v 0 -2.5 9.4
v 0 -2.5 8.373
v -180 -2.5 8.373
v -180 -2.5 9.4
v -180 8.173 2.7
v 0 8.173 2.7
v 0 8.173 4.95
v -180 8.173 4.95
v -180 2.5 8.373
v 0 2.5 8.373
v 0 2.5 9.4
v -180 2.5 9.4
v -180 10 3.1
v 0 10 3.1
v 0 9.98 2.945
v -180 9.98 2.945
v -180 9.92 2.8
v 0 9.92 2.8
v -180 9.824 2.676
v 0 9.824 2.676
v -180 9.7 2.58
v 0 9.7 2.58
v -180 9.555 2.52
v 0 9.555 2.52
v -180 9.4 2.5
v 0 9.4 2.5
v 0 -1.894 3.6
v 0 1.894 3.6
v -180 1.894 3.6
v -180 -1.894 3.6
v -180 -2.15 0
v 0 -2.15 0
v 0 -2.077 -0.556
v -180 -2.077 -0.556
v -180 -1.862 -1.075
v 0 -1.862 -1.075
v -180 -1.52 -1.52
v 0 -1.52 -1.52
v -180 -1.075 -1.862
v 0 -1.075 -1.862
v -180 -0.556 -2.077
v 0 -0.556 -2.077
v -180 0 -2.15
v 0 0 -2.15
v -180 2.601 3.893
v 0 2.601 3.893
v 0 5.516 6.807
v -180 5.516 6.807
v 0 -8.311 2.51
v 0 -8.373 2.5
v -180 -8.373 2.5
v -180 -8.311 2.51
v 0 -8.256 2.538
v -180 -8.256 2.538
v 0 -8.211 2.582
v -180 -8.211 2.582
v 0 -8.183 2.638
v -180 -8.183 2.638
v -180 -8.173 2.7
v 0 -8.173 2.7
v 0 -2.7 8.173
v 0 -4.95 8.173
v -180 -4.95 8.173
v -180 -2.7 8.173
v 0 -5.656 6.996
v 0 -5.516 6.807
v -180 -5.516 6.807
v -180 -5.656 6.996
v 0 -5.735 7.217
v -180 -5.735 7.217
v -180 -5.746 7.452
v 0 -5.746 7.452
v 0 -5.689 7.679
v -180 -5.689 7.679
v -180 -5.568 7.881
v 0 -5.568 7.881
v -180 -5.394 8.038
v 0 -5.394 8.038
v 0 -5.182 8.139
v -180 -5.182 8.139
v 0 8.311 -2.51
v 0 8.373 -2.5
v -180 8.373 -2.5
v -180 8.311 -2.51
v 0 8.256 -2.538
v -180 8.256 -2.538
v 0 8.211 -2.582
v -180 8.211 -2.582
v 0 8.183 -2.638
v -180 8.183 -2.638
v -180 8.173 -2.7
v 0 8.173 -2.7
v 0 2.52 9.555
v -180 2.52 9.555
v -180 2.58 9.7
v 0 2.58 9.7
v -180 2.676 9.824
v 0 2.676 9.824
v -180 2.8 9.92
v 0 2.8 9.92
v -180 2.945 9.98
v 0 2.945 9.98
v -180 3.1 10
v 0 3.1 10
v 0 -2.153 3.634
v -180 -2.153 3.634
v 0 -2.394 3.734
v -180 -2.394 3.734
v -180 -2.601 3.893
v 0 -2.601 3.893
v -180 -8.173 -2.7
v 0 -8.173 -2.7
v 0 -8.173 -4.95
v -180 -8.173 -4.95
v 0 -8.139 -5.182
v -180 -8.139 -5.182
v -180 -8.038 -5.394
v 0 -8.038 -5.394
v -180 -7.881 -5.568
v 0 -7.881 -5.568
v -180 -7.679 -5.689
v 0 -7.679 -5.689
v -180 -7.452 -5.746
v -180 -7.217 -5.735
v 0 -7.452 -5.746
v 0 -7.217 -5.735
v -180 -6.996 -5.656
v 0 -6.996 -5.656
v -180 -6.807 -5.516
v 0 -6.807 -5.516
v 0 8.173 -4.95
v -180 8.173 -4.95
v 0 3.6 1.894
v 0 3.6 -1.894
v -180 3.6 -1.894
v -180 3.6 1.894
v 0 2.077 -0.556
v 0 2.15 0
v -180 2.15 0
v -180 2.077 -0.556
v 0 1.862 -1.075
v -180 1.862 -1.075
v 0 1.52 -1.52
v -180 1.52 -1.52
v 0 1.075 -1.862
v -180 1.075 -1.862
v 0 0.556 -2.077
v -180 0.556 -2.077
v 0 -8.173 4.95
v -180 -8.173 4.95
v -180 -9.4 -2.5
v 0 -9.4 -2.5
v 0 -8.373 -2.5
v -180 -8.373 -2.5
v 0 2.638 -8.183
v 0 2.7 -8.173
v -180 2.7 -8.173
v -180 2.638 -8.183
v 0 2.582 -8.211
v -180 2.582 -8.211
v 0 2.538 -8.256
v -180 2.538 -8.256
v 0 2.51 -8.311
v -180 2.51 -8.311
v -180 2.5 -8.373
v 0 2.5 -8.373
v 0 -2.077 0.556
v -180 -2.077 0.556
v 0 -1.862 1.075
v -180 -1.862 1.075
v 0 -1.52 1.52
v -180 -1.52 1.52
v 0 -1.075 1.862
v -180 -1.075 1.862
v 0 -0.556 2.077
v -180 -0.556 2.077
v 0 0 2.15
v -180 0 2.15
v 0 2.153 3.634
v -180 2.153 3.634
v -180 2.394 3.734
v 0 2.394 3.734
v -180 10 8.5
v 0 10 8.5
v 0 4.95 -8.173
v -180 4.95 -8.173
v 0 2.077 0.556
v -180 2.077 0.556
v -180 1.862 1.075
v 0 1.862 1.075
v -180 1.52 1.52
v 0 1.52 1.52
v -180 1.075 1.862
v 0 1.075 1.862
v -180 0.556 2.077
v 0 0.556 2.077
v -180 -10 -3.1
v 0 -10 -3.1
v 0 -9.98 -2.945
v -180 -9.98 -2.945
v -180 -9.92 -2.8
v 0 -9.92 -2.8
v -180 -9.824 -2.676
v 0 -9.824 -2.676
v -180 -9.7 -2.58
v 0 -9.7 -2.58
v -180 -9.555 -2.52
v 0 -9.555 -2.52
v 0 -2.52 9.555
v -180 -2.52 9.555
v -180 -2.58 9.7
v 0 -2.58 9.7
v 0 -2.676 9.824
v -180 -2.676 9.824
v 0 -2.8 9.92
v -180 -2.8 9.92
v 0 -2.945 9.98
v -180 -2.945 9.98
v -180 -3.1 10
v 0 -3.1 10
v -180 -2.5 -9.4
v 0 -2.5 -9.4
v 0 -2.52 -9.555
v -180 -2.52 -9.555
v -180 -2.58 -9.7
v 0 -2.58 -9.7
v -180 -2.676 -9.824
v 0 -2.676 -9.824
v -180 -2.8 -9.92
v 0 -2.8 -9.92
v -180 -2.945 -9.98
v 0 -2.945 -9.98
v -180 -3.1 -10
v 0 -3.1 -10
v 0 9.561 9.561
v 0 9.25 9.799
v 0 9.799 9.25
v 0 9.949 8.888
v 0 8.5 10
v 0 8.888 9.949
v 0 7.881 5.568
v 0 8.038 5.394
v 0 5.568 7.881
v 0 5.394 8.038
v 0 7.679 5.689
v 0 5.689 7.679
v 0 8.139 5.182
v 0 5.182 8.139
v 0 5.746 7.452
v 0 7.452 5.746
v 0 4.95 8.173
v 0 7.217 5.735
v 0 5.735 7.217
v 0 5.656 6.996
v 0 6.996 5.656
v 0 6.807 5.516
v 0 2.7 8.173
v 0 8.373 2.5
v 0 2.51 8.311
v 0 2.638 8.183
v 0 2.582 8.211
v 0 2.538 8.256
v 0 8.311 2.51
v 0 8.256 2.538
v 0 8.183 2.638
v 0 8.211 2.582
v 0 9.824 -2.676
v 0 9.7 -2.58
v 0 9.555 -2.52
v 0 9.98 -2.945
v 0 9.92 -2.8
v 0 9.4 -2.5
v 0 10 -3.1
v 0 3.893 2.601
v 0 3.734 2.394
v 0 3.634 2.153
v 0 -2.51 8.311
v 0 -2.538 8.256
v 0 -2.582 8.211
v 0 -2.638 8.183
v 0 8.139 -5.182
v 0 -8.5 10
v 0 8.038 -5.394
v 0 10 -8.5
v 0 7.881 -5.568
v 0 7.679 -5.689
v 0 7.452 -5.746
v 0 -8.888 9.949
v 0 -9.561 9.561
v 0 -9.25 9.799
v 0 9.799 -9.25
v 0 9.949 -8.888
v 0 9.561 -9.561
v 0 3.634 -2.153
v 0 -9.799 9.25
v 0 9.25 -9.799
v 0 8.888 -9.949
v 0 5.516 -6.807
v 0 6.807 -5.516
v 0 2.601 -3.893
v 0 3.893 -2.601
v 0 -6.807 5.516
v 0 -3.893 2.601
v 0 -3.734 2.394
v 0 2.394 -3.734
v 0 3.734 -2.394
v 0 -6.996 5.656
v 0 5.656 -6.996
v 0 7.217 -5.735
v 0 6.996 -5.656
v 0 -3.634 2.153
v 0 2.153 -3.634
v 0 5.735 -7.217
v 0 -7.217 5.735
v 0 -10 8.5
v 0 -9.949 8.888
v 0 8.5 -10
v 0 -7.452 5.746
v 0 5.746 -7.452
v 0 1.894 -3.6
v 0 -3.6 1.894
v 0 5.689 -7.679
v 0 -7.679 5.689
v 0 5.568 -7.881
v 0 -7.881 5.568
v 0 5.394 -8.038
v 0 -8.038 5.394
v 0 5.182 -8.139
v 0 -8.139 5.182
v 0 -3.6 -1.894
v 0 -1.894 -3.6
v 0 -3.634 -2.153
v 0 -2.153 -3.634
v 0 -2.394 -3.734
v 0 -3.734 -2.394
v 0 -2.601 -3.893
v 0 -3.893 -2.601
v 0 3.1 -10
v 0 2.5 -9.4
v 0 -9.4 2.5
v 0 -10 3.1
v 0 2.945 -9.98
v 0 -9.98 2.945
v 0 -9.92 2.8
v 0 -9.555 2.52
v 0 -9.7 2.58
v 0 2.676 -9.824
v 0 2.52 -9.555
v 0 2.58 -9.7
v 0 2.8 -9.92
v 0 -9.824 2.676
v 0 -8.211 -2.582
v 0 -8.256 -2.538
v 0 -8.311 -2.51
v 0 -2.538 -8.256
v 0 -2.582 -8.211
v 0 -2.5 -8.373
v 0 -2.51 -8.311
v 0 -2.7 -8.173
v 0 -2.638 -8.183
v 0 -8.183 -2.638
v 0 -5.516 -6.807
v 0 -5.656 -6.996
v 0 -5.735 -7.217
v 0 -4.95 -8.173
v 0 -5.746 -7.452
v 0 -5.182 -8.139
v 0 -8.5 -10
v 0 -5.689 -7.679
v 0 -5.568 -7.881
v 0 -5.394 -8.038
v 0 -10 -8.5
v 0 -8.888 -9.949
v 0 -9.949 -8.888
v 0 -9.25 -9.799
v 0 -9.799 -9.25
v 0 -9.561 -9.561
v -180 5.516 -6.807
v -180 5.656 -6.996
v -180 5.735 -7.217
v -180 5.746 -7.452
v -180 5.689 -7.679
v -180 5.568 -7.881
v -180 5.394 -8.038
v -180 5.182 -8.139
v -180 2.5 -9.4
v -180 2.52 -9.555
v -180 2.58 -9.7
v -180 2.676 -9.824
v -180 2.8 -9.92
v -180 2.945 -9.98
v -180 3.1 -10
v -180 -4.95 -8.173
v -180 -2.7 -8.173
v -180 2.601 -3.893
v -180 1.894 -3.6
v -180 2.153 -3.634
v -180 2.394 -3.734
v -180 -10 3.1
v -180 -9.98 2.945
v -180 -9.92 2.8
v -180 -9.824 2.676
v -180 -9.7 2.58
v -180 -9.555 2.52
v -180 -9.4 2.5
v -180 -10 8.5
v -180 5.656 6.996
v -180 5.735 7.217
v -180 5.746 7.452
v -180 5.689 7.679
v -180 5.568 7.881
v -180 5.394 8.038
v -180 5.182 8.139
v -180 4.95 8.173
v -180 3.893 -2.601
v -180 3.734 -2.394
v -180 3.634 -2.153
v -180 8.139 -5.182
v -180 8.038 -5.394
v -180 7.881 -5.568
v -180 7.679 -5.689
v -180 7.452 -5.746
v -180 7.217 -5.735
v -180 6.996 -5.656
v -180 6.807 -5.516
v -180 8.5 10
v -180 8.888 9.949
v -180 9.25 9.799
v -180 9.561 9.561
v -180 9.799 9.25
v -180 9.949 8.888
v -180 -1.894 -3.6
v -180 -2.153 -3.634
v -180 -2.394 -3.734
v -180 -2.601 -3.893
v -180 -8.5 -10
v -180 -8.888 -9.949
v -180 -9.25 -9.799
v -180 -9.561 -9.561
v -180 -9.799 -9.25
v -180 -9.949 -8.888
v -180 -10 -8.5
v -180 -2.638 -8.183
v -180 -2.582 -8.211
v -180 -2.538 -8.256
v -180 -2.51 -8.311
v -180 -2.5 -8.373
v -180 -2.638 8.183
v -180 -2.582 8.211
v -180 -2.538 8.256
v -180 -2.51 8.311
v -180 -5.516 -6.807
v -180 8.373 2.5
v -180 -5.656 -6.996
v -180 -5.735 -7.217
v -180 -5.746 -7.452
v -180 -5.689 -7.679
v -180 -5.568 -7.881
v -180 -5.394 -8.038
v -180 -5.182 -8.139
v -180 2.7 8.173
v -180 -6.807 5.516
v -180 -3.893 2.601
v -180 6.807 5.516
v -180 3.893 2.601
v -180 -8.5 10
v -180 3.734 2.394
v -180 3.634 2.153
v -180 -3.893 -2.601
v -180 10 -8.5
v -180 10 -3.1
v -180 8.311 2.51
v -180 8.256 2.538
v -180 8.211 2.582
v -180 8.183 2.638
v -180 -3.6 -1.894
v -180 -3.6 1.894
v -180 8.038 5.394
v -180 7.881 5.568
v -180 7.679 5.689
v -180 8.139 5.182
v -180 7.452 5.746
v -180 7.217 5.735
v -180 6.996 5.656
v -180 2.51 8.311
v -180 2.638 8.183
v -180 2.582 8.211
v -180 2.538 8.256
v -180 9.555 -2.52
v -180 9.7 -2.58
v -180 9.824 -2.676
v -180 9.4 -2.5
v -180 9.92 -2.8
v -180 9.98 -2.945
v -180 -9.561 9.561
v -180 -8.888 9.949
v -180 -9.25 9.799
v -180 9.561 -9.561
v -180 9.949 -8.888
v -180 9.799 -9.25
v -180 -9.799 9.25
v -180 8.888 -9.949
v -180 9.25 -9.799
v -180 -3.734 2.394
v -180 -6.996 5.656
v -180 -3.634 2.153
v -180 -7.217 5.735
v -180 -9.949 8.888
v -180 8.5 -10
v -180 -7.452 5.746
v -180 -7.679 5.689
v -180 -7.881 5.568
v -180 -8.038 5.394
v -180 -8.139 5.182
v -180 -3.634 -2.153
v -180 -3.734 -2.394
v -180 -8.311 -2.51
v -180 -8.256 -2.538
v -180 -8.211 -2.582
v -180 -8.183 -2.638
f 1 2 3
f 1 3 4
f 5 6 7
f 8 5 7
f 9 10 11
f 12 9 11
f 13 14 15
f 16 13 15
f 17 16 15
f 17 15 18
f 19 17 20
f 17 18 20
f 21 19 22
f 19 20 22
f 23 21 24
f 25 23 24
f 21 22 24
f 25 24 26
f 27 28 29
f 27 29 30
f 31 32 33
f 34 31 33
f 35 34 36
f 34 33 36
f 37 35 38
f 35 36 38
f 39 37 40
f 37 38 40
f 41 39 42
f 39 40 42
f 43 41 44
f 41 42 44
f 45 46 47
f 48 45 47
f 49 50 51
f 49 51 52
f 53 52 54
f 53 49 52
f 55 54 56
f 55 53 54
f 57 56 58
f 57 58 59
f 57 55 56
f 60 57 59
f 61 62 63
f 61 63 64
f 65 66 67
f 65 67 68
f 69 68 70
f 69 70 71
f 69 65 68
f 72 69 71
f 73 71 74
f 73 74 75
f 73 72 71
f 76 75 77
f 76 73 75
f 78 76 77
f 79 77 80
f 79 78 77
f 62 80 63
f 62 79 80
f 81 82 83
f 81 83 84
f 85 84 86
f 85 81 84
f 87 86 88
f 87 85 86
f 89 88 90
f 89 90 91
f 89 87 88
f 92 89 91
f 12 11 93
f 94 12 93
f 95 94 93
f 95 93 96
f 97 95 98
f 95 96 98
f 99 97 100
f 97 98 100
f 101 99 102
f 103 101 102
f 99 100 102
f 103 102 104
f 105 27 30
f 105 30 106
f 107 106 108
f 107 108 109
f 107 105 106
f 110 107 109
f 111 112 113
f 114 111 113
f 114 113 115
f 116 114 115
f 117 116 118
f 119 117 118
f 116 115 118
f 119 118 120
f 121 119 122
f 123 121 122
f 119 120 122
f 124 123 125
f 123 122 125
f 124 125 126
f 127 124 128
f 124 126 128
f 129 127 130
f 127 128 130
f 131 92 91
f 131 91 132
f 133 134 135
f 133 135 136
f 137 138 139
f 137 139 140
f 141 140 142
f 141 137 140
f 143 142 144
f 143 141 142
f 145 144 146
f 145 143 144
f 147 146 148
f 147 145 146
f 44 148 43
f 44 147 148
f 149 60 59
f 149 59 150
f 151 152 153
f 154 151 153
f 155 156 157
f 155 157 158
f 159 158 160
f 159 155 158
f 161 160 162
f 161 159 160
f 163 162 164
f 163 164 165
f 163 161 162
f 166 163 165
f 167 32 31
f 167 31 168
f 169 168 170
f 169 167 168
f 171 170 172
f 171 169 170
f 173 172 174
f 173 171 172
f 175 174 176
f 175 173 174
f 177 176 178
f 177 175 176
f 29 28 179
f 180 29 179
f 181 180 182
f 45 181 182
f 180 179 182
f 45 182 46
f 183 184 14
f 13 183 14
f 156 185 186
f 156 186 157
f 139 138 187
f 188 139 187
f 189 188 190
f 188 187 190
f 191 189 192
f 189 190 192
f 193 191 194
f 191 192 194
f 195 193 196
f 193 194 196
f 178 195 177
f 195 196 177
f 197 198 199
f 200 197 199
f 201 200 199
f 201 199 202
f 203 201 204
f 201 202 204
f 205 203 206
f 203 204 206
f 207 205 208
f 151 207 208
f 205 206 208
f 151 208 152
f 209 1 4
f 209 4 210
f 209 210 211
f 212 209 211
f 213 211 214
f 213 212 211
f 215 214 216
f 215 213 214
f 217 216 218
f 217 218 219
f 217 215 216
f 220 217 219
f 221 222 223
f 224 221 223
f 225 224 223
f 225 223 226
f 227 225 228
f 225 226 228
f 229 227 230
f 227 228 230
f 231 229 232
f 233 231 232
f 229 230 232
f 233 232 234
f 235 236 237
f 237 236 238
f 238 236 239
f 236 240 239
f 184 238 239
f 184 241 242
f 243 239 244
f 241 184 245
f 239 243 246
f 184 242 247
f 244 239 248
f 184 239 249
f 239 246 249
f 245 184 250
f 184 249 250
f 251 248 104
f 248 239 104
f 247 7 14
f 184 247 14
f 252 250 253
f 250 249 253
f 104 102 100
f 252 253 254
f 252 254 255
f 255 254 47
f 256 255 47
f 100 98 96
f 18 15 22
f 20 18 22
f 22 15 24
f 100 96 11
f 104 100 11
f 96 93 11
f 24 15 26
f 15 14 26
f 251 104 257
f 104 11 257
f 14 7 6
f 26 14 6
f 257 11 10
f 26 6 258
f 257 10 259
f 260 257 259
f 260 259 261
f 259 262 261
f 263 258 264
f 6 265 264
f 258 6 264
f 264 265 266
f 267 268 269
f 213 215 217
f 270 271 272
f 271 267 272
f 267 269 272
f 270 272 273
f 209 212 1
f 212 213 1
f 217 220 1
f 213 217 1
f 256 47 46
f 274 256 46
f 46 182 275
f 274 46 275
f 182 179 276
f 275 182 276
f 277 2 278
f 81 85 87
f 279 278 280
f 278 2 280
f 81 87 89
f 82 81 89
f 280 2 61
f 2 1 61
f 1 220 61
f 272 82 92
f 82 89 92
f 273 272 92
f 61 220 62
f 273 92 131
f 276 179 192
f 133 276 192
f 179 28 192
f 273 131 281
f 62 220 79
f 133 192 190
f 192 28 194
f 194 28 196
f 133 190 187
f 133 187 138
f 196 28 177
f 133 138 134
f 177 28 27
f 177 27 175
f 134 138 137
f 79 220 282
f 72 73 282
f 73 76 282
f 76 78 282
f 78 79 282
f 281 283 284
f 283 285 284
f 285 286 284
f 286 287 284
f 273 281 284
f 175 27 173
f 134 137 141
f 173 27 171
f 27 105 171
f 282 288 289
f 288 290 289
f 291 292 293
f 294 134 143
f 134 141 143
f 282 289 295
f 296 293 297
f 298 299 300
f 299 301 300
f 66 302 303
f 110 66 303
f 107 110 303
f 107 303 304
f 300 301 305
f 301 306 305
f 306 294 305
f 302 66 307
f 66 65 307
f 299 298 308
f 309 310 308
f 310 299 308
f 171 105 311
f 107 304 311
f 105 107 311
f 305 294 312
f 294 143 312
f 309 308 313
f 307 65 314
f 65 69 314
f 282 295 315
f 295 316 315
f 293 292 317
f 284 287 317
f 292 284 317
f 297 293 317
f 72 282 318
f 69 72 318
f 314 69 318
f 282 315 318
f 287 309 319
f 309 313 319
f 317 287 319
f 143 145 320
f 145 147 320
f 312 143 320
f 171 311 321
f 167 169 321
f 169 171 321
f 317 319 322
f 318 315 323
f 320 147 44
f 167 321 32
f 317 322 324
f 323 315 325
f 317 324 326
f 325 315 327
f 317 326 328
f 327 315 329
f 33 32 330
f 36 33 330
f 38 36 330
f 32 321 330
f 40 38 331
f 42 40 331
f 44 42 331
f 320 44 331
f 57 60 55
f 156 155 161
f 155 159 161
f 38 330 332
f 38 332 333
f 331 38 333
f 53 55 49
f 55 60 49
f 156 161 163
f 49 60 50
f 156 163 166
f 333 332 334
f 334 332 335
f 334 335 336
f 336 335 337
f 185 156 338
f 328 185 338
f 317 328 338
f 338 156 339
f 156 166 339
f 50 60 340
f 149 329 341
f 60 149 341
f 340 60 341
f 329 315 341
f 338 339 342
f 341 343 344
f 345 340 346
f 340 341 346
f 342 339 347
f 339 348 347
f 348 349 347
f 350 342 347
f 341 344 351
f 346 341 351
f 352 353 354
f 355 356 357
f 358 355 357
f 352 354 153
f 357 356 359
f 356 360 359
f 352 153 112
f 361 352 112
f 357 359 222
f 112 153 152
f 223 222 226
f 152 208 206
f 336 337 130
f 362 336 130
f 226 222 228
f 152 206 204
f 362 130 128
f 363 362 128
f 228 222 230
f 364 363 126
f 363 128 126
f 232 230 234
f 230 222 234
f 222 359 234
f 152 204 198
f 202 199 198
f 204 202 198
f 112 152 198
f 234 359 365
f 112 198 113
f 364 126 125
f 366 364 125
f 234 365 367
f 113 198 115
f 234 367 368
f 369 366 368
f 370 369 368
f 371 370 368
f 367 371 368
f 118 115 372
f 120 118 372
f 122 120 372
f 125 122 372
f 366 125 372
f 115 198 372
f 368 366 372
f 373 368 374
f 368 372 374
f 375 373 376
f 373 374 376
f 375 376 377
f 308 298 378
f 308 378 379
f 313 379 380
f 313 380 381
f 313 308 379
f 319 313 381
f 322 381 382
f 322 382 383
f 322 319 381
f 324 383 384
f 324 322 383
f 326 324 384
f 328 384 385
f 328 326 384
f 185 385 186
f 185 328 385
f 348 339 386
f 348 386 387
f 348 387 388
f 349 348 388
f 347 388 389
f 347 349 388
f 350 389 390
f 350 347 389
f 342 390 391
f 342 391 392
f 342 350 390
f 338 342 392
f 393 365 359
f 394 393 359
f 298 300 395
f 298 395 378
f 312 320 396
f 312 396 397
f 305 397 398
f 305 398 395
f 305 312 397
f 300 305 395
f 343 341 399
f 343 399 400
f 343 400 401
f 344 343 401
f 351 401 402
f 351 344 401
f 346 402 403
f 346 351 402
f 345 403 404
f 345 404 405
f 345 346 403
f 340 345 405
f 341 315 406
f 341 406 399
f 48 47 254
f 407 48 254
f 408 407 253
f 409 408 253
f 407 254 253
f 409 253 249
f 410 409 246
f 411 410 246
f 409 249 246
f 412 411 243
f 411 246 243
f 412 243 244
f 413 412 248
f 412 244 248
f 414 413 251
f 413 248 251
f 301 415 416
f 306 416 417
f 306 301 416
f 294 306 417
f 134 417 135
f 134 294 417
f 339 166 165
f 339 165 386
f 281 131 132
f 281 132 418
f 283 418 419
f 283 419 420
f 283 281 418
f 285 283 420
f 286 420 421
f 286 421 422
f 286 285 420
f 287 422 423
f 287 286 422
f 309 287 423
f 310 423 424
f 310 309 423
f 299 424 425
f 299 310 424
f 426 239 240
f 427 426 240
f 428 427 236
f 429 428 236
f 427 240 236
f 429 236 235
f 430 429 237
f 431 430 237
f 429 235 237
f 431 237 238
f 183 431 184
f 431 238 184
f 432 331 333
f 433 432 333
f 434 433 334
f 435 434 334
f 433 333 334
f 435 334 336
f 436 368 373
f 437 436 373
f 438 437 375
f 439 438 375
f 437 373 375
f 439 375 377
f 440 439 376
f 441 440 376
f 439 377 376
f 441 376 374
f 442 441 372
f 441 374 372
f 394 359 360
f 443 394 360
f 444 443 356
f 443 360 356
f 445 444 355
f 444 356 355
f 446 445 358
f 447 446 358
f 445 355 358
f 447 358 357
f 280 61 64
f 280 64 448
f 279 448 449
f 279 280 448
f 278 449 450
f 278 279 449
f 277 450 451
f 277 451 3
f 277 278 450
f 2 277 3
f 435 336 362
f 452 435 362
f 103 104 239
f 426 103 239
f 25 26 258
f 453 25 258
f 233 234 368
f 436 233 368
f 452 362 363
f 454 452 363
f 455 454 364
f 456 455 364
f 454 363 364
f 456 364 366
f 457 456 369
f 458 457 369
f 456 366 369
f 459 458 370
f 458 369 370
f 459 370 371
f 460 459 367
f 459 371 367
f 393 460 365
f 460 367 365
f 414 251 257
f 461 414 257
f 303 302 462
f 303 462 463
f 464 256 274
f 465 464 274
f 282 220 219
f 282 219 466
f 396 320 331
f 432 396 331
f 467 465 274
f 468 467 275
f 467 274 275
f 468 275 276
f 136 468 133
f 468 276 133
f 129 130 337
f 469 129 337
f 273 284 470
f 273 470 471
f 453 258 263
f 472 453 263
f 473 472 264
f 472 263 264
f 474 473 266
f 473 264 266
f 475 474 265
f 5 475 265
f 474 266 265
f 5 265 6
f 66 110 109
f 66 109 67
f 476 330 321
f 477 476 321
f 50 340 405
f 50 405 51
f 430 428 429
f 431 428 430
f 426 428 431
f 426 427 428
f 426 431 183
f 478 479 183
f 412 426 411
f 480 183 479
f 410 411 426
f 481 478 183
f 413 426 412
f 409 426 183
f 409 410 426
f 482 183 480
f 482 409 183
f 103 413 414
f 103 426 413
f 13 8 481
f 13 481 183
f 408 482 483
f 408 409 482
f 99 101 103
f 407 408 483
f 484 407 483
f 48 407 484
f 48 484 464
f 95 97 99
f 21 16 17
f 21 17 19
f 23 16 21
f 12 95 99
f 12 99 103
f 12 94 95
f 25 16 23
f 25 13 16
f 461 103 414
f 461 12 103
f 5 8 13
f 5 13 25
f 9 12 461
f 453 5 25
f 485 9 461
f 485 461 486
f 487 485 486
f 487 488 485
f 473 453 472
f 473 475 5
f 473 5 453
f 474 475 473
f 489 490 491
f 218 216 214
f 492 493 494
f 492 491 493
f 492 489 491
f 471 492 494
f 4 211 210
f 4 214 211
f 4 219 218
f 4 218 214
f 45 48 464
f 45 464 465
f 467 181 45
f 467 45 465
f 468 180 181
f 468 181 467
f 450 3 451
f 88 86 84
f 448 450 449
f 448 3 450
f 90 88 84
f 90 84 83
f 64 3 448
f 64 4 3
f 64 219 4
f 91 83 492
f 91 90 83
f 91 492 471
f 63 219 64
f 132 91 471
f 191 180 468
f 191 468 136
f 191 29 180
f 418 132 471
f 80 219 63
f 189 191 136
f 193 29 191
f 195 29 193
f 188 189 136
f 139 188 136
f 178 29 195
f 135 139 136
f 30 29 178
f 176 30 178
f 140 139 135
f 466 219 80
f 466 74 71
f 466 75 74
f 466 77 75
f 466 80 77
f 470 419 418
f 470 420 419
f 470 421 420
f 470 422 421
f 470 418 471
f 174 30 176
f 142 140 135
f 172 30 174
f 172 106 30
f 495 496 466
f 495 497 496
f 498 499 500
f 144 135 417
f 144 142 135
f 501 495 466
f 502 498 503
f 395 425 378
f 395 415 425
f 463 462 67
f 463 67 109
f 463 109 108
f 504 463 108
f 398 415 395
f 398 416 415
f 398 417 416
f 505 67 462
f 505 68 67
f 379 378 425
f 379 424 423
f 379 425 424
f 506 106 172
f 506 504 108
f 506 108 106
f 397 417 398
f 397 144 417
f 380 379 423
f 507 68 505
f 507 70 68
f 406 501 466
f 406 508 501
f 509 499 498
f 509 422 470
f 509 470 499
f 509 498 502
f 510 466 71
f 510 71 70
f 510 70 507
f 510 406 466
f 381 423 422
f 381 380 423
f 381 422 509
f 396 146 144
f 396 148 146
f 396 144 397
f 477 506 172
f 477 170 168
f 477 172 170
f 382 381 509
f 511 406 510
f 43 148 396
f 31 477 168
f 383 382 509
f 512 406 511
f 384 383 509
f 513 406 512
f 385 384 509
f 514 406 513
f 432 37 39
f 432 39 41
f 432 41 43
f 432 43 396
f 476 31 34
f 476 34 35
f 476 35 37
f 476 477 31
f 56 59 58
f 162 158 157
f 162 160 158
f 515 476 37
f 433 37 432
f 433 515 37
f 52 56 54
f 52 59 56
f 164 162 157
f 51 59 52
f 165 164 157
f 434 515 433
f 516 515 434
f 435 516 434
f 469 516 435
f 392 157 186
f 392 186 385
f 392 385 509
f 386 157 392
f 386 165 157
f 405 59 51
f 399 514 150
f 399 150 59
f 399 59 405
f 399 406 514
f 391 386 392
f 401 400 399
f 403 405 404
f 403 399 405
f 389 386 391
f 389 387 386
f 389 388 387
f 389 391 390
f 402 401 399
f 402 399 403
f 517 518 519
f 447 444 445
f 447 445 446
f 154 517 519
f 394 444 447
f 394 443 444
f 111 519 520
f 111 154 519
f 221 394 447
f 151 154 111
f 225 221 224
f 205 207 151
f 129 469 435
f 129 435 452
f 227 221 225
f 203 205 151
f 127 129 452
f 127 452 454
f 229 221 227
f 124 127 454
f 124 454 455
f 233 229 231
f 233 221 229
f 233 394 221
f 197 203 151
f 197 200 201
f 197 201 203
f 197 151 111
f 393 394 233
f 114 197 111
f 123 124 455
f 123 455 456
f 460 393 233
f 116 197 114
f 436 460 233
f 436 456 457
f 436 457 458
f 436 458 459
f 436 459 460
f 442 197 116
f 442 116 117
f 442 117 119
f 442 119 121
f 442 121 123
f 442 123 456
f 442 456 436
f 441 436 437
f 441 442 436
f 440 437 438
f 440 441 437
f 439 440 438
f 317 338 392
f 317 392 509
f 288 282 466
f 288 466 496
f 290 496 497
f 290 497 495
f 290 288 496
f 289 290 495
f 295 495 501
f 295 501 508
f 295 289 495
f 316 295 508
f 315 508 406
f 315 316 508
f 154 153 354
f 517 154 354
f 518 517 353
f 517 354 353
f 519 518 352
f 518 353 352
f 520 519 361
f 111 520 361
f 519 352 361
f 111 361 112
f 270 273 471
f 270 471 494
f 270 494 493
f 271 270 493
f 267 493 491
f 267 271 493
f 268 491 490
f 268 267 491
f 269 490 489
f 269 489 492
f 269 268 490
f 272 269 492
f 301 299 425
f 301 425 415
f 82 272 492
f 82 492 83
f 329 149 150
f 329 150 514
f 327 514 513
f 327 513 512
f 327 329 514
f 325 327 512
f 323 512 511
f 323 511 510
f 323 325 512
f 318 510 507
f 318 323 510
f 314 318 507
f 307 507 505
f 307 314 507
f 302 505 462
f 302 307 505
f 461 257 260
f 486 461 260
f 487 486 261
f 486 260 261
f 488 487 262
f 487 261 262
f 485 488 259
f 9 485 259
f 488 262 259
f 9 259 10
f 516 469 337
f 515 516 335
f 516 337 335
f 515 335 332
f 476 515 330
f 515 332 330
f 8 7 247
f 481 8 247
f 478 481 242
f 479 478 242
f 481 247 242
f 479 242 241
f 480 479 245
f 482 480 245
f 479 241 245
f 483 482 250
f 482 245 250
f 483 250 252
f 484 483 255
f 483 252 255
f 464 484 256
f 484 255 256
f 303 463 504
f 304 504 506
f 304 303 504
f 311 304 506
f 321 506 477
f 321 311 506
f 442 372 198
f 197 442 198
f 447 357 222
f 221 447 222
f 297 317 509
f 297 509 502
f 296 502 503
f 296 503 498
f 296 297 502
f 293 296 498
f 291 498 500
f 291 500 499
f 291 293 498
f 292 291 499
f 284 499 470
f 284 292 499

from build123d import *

# Parameters (mm, degrees)
BOSS_EXTRUDE1_DEPTH = 180


with BuildPart() as part:
    # Sketch3 → Boss-Extrude1 (new body)
    with BuildSketch(Plane(origin=(0, 0, 0), x_dir=(0, 0, -1), z_dir=(1, 0, 0))):
        with BuildLine():
            Line((-5.515685425, 6.807463915), (-2.601114729, 3.892893219))
            ThreePointArc((-2.601114729, 3.892893219), (-2.27669138, 3.676120467), (-1.894007948, 3.6))
            Line((-1.894007948, 3.6), (0, 3.6))
            Line((0, 3.6), (0, 2.15))
            ThreePointArc((0, 2.15), (-1.52027958, 1.52027958), (-2.15, 0))
            Line((-2.15, 0), (-3.6, 0))
            Line((-3.6, 0), (-3.6, 1.894007948))
            ThreePointArc((-3.6, 1.894007948), (-3.676120467, 2.27669138), (-3.892893219, 2.601114729))
            Line((-3.892893219, 2.601114729), (-6.807463915, 5.515685425))
            ThreePointArc((-6.807463915, 5.515685425), (-7.679296086, 5.689103626), (-8.17314934, 4.95))
            Line((-8.17314934, 4.95), (-8.17314934, 2.7))
            ThreePointArc((-8.17314934, 2.7), (-8.231727984, 2.558578644), (-8.37314934, 2.5))
            Line((-8.37314934, 2.5), (-9.4, 2.5))
            ThreePointArc((-9.4, 2.5), (-9.824264069, 2.675735931), (-10, 3.1))
            Line((-10, 3.1), (-10, 8.5))
            ThreePointArc((-10, 8.5), (-9.560660172, 9.560660172), (-8.5, 10))
            Line((-8.5, 10), (-3.1, 10))
            ThreePointArc((-3.1, 10), (-2.675735931, 9.824264069), (-2.5, 9.4))
            Line((-2.5, 9.4), (-2.5, 8.37314934))
            ThreePointArc((-2.5, 8.37314934), (-2.558578644, 8.231727984), (-2.7, 8.17314934))
            Line((-2.7, 8.17314934), (-4.95, 8.17314934))
            ThreePointArc((-4.95, 8.17314934), (-5.689103626, 7.679296086), (-5.515685425, 6.807463915))
        make_face()
    extrude(amount=-BOSS_EXTRUDE1_DEPTH)

    # Mirror1: part across plane


with BuildPart() as part_1:
    add(part.part)
    add(part.part.mirror(Plane.ZX))

    # Mirror2: part across plane


with BuildPart() as part_2:
    add(part_1.part)
    add(part_1.part.mirror(Plane.XY))


solid = part_2.part
